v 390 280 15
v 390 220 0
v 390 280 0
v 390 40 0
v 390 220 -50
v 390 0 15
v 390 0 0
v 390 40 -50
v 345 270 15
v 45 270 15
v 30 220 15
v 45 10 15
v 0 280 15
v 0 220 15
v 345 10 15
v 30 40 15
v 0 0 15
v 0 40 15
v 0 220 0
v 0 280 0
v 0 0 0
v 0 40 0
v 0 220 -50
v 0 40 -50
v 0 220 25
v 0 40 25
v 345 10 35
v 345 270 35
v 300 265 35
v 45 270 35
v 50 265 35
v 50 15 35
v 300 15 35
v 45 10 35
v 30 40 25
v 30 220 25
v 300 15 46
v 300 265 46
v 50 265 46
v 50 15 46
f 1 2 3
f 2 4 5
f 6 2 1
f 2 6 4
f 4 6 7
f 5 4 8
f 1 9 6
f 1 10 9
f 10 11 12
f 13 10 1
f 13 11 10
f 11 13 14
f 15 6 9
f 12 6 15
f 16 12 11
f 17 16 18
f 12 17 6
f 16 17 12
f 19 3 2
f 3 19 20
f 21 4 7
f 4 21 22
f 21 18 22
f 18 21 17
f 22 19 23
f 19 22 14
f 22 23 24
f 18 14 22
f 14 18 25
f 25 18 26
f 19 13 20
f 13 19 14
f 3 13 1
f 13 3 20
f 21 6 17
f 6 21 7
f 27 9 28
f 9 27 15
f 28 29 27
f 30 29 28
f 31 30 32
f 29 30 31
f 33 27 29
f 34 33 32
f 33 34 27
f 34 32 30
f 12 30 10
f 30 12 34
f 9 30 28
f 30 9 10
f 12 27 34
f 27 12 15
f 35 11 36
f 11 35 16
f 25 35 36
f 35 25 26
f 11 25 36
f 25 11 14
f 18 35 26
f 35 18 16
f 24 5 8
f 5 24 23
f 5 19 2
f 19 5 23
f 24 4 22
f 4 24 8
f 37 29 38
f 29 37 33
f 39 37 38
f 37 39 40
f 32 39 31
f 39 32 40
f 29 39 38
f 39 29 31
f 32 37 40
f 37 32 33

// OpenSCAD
// file: tools_lib.scad
screw8_hole();

translate([0,100,0]) screw8();

translate([100,0,0]) screw4_hole();

translate([100,100,0]) screw4();

translate([200,0,0]) m2_50_hole();

translate([200,100,0]) m2_50();

module m2_50() {
  color("Silver") {
    union() {
      cylinder(100,10,10);
      cylinder(20,20,20);
      translate([0,0,20]) cylinder(5,40,40);
      translate([0,0,75]) cylinder(5,40,40);
      translate([0,0,80]) cylinder(20,20,20);
    }
  }
}

module m2_50_hole() {
    union() {
      cylinder(100,11,11);
      translate([0,0,75]) cylinder(80,40,40);
      translate([0,0,-55]) cylinder(80,40,40);
    }
}

module screw8_hole() {
  // screw protrudes 5 clearance
  union() {
    translate([ 0,0,-5]) cylinder(75,12,12);
    translate([0,0,40]) cylinder(40,14,14);
    translate([0,0,80]) cylinder(100,24,24);
  }
}

module screw4_hole() {
  // screw protrudes 5 clearance
  union() {
    translate([ 0,0,-5]) cylinder(35,11,11);
    translate([0,0,30]) cylinder(10,14,14);
    translate([0,0,40]) cylinder(60,24,24);
  }
}


module screw4() {
  color("Silver") {
    difference() {
      union() {
        cylinder(40,13,13);
        translate([0,0,40]) cylinder(20,23,23);
      }
    translate([-15,-3,55]) cube([30,6,6]);
    translate([-3,-15,55]) cube([6,30,6]);
    }
  }
}

module screw8() {
  color("Silver") {
    difference() {
      union() {
        cylinder(80,13,13);
        translate([0,0,80]) cylinder(20,23,23);
      }
    translate([-15,-3,95]) cube([30,6,6]);
    translate([-3,-15,95]) cube([6,30,6]);
    }
  }
}
// file: shapes_lib.scad
rounded_cube(100,200,30,10,30);
%cube([100,200,30]);

translate([200,0,0]) rounded_cylinder(100, 40, 10);
%translate([200,0,0]) cylinder(100, 40, 40);

translate([300,0,0]) edged_cube(100, 200, 50,10);
%translate([300,0,0]) cube([100, 200, 50]);


module board_cutout(l,w,h,r) {
  difference() {
    union(){
      translate([r,r,0]) cube([l-2*r,w-2*r,h]);
      translate([2*r,0,0]) cube([l-4*r,r,h]);
      translate([2*r,w-r,0]) cube([l-4*r,r,h]);
      translate([0,2*r,0]) cube([r,w-4*r,h]);
      translate([l-r,2*r,0]) cube([r,w-4*r,h]);
    }
    translate([r,r,0]) cylinder(h+1,r,r);
    translate([l-r,r,0]) cylinder(h+1,r,r);
    translate([r,w-r,0]) cylinder(h+1,r,r);
    translate([l-r,w-r,0]) cylinder(h+1,r,r);
  }
}

module rounded_hole(h=100, r=50, c=10) {
  difference() {
    union() {
      translate([0,0,0]) cylinder(c, r+c, r+c);
      translate([0,0,0]) cylinder(h, r, r);
      translate([0,0,h-c]) cylinder(c, r+c, r+c);
    }
    rotate_extrude() translate([r+c, c, 0]) circle(c);
    rotate_extrude() translate([r+c, h-c, 0]) circle(c);
  }
}

module rounded_cylinder(h, r, c) {
  // h = heigth
  // r = radius
  // c = corner radius
  
  union() {
    rotate_extrude() translate([r-c, c, 0]) circle(r = c);
    rotate_extrude() translate([r-c, h-c, 0]) circle(r = c);
    translate([0,0,c]) cylinder(h-2*c, r, r);
    cylinder(h, r-c, r-c);
  }
}

module rounded_base(x,y,z,cr) {
  hull() {
    translate([   cr,   cr, 0 ]) cylinder( z, cr, cr );
    translate([ x-cr,   cr, 0 ]) cylinder( z, cr, cr );
    translate([   cr, y-cr, 0 ]) cylinder( z, cr, cr );
    translate([ x-cr, y-cr, 0 ]) cylinder( z, cr, cr );
  }
}

module edged_cube(x,y,z,er) {
  if (z>=2*er) {
    hull() {
      // bottom spheres
      translate([ er,   er,   er ]) sphere( er );
      translate([ x-er, er,   er ]) sphere( er );
      translate([ er,   y-er, er ]) sphere( er );
      translate([ x-er, y-er, er ]) sphere( er );

      // top spheres
      translate([ er,   er  , z-er ]) sphere( er );
      translate([ x-er, er  , z-er ]) sphere( er );
      translate([ er,   y-er, z-er ]) sphere( er );
      translate([ x-er, y-er, z-er ]) sphere( er );
    }
  } else {
    echo (" z ! >= 2 * er ");
  }
}


module rounded_cube(x,y,z,er,cr) {
  // er = edge radius
  // cr = corner radius
  // er must be smaller than cr

  // X bottom
  rotate([0,90,0]) translate([-er,er,cr+er]) cylinder(x-2*cr-2*er,er,er);
  rotate([0,90,0]) translate([-z+er,er,cr+er]) cylinder(x-2*cr-2*er,er,er);
  // X top
  rotate([0,90,0]) translate([-er,y-er,cr+er]) cylinder(x-2*cr-2*er,er,er);
  rotate([0,90,0]) translate([-z+er,y-er,cr+er]) cylinder(x-2*cr-2*er,er,er);
  // Y left
  rotate([-90,0,0]) translate([er,-er,cr+er]) cylinder(y-2*cr-2*er,er,er);
  rotate([-90,0,0]) translate([er,-z+er,cr+er]) cylinder(y-2*cr-2*er,er,er);
  // Y right
  rotate([-90,0,0]) translate([x-er,-er,cr+er]) cylinder(y-2*cr-2*er,er,er);
  rotate([-90,0,0]) translate([x-er,-z+er,cr+er]) cylinder(y-2*cr-2*er,er,er);
  
  // corner donut
  // bottom left
  translate([cr+er,cr+er,er]) rotate_extrude() translate([cr,0,0]) circle(er);
  translate([cr+er,cr+er,z-er]) rotate_extrude() translate([cr,0,0]) circle(er);
  // top left
  translate([cr+er,y-cr-er,er]) rotate_extrude() translate([cr,0,0]) circle(er);
  translate([cr+er,y-cr-er,z-er]) rotate_extrude() translate([cr,0,0]) circle(er);
  // bottom right
  translate([x-cr-er,cr+er,er]) rotate_extrude() translate([cr,0,0]) circle(er);
  translate([x-cr-er,cr+er,z-er]) rotate_extrude() translate([cr,0,0]) circle(er);
  // top right
  translate([x-cr-er,y-cr-er,er]) rotate_extrude() translate([cr,0,0]) circle(er);
  translate([x-cr-er,y-cr-er,z-er]) rotate_extrude() translate([cr,0,0]) circle(er);
  
  // corner cylinder
  // bottom left
  translate([cr+er,cr+er,er]) cylinder(z-2*er,cr+er,cr+er);
  translate([cr+er,cr+er,0]) cylinder(z,cr,cr);
  // top left
  translate([cr+er,y-cr-er,er]) cylinder(z-2*er,cr+er,cr+er);
  translate([cr+er,y-cr-er,0]) cylinder(z,cr,cr);
  // bottom right
  translate([x-cr-er,cr+er,er]) cylinder(z-2*er,cr+er,cr+er);
  translate([x-cr-er,cr+er,0]) cylinder(z,cr,cr);
  // top right
  translate([x-cr-er,y-cr-er,er]) cylinder(z-2*er,cr+er,cr+er);
  translate([x-cr-er,y-cr-er,0]) cylinder(z,cr,cr);
  
  // center cube
  translate([cr+er,0,er]) cube([x-2*cr-2*er,y,z-2*er]);
  translate([0,cr+er,er]) cube([x,y-2*cr-2*er,z-2*er]);
  translate([er,cr+er,0]) cube([x-2*er,y-2*cr-2*er,z]);
  translate([cr+er,er,0]) cube([x-2*cr-2*er,y-2*er,z]);
}
// main file
use <shapes_lib.scad>
use <tools_lib.scad>

r=25; //chopstick radius

//i2smic();
//translate([200,0,0]) rpi0w();
//translate([-300,0,0]) oled96();
240ips();

module 240ips() {
  difference() {
    union() {
      color("royalblue") cube([390,280,15]);
      color("black") translate([45,10,15]) cube([300,260,20]);
      color("silver") translate([0,40,15]) cube([30,180,10]);
      color("black") translate([0,40,-50]) cube([390,180,50]);
      #translate([50,15,35]) cube([250,250,11]);
    }
    //translate([25,25,-1]) cylinder(17, 11,11);
    //translate([365,25,-1]) cylinder(17, 11,11);
    //translate([25,255,-1]) cylinder(17, 11,11);
    //translate([365,255,-1]) cylinder(17, 11,11);
  }
}







module i2smic() {
  union() {
    color("royalblue") cube([162,112,10]);
    color("silver") translate([23+58-25, 0, -20]) cube([50,50,20]);
    #translate([23,       25,-40]) screw8_hole();
    #translate([23+116,   25,-40]) screw8_hole();
  }
}





module rpi0w() {
    difference() {
        union() {
            color("MediumSeaGreen") cube([650,300,15]);
            translate([40,40,0])  color("Khaki") cylinder(15, 30,30);
            translate([610,40,0])  color("Khaki") cylinder(15, 30,30);
            translate([610,260,0])  color("Khaki") cylinder(15, 30,30);
            translate([40,260,0])  color("Khaki") cylinder(15, 30,30);
            translate([370,-20,15]) color("silver") cube ([80,60,30]);
            translate([500,-20,15]) color("silver") cube ([80,60,30]);
            translate([20,100,15]) color("silver") cube ([110,120,15]);
        }
        translate([40,40,0]) cylinder(15, 14,14);
        translate([610,40,0]) cylinder(15, 14,14);
        translate([610,260,0]) cylinder(15, 14,14);
        translate([40,260,0]) cylinder(15, 14,14);
    }
}



module oled96() {
  difference() {
  union() {
    color ("royalblue") rounded_cube(272,274,10,0,10);
    color("black") translate([2,70,10]) cube([268,156,15]);
    color("dimgrey") translate([57,40,10]) cube([160,30,10]);
    color("grey") translate([87,0,10]) cube([100,40,5]);
  }

  translate([30,20,-1]) cylinder(12,10,10);
  translate([242,20,-1]) cylinder(12,10,10);

  translate([30,254,-1]) cylinder(12,10,10);
  translate([242,254,-1]) cylinder(12,10,10);
  }
}
